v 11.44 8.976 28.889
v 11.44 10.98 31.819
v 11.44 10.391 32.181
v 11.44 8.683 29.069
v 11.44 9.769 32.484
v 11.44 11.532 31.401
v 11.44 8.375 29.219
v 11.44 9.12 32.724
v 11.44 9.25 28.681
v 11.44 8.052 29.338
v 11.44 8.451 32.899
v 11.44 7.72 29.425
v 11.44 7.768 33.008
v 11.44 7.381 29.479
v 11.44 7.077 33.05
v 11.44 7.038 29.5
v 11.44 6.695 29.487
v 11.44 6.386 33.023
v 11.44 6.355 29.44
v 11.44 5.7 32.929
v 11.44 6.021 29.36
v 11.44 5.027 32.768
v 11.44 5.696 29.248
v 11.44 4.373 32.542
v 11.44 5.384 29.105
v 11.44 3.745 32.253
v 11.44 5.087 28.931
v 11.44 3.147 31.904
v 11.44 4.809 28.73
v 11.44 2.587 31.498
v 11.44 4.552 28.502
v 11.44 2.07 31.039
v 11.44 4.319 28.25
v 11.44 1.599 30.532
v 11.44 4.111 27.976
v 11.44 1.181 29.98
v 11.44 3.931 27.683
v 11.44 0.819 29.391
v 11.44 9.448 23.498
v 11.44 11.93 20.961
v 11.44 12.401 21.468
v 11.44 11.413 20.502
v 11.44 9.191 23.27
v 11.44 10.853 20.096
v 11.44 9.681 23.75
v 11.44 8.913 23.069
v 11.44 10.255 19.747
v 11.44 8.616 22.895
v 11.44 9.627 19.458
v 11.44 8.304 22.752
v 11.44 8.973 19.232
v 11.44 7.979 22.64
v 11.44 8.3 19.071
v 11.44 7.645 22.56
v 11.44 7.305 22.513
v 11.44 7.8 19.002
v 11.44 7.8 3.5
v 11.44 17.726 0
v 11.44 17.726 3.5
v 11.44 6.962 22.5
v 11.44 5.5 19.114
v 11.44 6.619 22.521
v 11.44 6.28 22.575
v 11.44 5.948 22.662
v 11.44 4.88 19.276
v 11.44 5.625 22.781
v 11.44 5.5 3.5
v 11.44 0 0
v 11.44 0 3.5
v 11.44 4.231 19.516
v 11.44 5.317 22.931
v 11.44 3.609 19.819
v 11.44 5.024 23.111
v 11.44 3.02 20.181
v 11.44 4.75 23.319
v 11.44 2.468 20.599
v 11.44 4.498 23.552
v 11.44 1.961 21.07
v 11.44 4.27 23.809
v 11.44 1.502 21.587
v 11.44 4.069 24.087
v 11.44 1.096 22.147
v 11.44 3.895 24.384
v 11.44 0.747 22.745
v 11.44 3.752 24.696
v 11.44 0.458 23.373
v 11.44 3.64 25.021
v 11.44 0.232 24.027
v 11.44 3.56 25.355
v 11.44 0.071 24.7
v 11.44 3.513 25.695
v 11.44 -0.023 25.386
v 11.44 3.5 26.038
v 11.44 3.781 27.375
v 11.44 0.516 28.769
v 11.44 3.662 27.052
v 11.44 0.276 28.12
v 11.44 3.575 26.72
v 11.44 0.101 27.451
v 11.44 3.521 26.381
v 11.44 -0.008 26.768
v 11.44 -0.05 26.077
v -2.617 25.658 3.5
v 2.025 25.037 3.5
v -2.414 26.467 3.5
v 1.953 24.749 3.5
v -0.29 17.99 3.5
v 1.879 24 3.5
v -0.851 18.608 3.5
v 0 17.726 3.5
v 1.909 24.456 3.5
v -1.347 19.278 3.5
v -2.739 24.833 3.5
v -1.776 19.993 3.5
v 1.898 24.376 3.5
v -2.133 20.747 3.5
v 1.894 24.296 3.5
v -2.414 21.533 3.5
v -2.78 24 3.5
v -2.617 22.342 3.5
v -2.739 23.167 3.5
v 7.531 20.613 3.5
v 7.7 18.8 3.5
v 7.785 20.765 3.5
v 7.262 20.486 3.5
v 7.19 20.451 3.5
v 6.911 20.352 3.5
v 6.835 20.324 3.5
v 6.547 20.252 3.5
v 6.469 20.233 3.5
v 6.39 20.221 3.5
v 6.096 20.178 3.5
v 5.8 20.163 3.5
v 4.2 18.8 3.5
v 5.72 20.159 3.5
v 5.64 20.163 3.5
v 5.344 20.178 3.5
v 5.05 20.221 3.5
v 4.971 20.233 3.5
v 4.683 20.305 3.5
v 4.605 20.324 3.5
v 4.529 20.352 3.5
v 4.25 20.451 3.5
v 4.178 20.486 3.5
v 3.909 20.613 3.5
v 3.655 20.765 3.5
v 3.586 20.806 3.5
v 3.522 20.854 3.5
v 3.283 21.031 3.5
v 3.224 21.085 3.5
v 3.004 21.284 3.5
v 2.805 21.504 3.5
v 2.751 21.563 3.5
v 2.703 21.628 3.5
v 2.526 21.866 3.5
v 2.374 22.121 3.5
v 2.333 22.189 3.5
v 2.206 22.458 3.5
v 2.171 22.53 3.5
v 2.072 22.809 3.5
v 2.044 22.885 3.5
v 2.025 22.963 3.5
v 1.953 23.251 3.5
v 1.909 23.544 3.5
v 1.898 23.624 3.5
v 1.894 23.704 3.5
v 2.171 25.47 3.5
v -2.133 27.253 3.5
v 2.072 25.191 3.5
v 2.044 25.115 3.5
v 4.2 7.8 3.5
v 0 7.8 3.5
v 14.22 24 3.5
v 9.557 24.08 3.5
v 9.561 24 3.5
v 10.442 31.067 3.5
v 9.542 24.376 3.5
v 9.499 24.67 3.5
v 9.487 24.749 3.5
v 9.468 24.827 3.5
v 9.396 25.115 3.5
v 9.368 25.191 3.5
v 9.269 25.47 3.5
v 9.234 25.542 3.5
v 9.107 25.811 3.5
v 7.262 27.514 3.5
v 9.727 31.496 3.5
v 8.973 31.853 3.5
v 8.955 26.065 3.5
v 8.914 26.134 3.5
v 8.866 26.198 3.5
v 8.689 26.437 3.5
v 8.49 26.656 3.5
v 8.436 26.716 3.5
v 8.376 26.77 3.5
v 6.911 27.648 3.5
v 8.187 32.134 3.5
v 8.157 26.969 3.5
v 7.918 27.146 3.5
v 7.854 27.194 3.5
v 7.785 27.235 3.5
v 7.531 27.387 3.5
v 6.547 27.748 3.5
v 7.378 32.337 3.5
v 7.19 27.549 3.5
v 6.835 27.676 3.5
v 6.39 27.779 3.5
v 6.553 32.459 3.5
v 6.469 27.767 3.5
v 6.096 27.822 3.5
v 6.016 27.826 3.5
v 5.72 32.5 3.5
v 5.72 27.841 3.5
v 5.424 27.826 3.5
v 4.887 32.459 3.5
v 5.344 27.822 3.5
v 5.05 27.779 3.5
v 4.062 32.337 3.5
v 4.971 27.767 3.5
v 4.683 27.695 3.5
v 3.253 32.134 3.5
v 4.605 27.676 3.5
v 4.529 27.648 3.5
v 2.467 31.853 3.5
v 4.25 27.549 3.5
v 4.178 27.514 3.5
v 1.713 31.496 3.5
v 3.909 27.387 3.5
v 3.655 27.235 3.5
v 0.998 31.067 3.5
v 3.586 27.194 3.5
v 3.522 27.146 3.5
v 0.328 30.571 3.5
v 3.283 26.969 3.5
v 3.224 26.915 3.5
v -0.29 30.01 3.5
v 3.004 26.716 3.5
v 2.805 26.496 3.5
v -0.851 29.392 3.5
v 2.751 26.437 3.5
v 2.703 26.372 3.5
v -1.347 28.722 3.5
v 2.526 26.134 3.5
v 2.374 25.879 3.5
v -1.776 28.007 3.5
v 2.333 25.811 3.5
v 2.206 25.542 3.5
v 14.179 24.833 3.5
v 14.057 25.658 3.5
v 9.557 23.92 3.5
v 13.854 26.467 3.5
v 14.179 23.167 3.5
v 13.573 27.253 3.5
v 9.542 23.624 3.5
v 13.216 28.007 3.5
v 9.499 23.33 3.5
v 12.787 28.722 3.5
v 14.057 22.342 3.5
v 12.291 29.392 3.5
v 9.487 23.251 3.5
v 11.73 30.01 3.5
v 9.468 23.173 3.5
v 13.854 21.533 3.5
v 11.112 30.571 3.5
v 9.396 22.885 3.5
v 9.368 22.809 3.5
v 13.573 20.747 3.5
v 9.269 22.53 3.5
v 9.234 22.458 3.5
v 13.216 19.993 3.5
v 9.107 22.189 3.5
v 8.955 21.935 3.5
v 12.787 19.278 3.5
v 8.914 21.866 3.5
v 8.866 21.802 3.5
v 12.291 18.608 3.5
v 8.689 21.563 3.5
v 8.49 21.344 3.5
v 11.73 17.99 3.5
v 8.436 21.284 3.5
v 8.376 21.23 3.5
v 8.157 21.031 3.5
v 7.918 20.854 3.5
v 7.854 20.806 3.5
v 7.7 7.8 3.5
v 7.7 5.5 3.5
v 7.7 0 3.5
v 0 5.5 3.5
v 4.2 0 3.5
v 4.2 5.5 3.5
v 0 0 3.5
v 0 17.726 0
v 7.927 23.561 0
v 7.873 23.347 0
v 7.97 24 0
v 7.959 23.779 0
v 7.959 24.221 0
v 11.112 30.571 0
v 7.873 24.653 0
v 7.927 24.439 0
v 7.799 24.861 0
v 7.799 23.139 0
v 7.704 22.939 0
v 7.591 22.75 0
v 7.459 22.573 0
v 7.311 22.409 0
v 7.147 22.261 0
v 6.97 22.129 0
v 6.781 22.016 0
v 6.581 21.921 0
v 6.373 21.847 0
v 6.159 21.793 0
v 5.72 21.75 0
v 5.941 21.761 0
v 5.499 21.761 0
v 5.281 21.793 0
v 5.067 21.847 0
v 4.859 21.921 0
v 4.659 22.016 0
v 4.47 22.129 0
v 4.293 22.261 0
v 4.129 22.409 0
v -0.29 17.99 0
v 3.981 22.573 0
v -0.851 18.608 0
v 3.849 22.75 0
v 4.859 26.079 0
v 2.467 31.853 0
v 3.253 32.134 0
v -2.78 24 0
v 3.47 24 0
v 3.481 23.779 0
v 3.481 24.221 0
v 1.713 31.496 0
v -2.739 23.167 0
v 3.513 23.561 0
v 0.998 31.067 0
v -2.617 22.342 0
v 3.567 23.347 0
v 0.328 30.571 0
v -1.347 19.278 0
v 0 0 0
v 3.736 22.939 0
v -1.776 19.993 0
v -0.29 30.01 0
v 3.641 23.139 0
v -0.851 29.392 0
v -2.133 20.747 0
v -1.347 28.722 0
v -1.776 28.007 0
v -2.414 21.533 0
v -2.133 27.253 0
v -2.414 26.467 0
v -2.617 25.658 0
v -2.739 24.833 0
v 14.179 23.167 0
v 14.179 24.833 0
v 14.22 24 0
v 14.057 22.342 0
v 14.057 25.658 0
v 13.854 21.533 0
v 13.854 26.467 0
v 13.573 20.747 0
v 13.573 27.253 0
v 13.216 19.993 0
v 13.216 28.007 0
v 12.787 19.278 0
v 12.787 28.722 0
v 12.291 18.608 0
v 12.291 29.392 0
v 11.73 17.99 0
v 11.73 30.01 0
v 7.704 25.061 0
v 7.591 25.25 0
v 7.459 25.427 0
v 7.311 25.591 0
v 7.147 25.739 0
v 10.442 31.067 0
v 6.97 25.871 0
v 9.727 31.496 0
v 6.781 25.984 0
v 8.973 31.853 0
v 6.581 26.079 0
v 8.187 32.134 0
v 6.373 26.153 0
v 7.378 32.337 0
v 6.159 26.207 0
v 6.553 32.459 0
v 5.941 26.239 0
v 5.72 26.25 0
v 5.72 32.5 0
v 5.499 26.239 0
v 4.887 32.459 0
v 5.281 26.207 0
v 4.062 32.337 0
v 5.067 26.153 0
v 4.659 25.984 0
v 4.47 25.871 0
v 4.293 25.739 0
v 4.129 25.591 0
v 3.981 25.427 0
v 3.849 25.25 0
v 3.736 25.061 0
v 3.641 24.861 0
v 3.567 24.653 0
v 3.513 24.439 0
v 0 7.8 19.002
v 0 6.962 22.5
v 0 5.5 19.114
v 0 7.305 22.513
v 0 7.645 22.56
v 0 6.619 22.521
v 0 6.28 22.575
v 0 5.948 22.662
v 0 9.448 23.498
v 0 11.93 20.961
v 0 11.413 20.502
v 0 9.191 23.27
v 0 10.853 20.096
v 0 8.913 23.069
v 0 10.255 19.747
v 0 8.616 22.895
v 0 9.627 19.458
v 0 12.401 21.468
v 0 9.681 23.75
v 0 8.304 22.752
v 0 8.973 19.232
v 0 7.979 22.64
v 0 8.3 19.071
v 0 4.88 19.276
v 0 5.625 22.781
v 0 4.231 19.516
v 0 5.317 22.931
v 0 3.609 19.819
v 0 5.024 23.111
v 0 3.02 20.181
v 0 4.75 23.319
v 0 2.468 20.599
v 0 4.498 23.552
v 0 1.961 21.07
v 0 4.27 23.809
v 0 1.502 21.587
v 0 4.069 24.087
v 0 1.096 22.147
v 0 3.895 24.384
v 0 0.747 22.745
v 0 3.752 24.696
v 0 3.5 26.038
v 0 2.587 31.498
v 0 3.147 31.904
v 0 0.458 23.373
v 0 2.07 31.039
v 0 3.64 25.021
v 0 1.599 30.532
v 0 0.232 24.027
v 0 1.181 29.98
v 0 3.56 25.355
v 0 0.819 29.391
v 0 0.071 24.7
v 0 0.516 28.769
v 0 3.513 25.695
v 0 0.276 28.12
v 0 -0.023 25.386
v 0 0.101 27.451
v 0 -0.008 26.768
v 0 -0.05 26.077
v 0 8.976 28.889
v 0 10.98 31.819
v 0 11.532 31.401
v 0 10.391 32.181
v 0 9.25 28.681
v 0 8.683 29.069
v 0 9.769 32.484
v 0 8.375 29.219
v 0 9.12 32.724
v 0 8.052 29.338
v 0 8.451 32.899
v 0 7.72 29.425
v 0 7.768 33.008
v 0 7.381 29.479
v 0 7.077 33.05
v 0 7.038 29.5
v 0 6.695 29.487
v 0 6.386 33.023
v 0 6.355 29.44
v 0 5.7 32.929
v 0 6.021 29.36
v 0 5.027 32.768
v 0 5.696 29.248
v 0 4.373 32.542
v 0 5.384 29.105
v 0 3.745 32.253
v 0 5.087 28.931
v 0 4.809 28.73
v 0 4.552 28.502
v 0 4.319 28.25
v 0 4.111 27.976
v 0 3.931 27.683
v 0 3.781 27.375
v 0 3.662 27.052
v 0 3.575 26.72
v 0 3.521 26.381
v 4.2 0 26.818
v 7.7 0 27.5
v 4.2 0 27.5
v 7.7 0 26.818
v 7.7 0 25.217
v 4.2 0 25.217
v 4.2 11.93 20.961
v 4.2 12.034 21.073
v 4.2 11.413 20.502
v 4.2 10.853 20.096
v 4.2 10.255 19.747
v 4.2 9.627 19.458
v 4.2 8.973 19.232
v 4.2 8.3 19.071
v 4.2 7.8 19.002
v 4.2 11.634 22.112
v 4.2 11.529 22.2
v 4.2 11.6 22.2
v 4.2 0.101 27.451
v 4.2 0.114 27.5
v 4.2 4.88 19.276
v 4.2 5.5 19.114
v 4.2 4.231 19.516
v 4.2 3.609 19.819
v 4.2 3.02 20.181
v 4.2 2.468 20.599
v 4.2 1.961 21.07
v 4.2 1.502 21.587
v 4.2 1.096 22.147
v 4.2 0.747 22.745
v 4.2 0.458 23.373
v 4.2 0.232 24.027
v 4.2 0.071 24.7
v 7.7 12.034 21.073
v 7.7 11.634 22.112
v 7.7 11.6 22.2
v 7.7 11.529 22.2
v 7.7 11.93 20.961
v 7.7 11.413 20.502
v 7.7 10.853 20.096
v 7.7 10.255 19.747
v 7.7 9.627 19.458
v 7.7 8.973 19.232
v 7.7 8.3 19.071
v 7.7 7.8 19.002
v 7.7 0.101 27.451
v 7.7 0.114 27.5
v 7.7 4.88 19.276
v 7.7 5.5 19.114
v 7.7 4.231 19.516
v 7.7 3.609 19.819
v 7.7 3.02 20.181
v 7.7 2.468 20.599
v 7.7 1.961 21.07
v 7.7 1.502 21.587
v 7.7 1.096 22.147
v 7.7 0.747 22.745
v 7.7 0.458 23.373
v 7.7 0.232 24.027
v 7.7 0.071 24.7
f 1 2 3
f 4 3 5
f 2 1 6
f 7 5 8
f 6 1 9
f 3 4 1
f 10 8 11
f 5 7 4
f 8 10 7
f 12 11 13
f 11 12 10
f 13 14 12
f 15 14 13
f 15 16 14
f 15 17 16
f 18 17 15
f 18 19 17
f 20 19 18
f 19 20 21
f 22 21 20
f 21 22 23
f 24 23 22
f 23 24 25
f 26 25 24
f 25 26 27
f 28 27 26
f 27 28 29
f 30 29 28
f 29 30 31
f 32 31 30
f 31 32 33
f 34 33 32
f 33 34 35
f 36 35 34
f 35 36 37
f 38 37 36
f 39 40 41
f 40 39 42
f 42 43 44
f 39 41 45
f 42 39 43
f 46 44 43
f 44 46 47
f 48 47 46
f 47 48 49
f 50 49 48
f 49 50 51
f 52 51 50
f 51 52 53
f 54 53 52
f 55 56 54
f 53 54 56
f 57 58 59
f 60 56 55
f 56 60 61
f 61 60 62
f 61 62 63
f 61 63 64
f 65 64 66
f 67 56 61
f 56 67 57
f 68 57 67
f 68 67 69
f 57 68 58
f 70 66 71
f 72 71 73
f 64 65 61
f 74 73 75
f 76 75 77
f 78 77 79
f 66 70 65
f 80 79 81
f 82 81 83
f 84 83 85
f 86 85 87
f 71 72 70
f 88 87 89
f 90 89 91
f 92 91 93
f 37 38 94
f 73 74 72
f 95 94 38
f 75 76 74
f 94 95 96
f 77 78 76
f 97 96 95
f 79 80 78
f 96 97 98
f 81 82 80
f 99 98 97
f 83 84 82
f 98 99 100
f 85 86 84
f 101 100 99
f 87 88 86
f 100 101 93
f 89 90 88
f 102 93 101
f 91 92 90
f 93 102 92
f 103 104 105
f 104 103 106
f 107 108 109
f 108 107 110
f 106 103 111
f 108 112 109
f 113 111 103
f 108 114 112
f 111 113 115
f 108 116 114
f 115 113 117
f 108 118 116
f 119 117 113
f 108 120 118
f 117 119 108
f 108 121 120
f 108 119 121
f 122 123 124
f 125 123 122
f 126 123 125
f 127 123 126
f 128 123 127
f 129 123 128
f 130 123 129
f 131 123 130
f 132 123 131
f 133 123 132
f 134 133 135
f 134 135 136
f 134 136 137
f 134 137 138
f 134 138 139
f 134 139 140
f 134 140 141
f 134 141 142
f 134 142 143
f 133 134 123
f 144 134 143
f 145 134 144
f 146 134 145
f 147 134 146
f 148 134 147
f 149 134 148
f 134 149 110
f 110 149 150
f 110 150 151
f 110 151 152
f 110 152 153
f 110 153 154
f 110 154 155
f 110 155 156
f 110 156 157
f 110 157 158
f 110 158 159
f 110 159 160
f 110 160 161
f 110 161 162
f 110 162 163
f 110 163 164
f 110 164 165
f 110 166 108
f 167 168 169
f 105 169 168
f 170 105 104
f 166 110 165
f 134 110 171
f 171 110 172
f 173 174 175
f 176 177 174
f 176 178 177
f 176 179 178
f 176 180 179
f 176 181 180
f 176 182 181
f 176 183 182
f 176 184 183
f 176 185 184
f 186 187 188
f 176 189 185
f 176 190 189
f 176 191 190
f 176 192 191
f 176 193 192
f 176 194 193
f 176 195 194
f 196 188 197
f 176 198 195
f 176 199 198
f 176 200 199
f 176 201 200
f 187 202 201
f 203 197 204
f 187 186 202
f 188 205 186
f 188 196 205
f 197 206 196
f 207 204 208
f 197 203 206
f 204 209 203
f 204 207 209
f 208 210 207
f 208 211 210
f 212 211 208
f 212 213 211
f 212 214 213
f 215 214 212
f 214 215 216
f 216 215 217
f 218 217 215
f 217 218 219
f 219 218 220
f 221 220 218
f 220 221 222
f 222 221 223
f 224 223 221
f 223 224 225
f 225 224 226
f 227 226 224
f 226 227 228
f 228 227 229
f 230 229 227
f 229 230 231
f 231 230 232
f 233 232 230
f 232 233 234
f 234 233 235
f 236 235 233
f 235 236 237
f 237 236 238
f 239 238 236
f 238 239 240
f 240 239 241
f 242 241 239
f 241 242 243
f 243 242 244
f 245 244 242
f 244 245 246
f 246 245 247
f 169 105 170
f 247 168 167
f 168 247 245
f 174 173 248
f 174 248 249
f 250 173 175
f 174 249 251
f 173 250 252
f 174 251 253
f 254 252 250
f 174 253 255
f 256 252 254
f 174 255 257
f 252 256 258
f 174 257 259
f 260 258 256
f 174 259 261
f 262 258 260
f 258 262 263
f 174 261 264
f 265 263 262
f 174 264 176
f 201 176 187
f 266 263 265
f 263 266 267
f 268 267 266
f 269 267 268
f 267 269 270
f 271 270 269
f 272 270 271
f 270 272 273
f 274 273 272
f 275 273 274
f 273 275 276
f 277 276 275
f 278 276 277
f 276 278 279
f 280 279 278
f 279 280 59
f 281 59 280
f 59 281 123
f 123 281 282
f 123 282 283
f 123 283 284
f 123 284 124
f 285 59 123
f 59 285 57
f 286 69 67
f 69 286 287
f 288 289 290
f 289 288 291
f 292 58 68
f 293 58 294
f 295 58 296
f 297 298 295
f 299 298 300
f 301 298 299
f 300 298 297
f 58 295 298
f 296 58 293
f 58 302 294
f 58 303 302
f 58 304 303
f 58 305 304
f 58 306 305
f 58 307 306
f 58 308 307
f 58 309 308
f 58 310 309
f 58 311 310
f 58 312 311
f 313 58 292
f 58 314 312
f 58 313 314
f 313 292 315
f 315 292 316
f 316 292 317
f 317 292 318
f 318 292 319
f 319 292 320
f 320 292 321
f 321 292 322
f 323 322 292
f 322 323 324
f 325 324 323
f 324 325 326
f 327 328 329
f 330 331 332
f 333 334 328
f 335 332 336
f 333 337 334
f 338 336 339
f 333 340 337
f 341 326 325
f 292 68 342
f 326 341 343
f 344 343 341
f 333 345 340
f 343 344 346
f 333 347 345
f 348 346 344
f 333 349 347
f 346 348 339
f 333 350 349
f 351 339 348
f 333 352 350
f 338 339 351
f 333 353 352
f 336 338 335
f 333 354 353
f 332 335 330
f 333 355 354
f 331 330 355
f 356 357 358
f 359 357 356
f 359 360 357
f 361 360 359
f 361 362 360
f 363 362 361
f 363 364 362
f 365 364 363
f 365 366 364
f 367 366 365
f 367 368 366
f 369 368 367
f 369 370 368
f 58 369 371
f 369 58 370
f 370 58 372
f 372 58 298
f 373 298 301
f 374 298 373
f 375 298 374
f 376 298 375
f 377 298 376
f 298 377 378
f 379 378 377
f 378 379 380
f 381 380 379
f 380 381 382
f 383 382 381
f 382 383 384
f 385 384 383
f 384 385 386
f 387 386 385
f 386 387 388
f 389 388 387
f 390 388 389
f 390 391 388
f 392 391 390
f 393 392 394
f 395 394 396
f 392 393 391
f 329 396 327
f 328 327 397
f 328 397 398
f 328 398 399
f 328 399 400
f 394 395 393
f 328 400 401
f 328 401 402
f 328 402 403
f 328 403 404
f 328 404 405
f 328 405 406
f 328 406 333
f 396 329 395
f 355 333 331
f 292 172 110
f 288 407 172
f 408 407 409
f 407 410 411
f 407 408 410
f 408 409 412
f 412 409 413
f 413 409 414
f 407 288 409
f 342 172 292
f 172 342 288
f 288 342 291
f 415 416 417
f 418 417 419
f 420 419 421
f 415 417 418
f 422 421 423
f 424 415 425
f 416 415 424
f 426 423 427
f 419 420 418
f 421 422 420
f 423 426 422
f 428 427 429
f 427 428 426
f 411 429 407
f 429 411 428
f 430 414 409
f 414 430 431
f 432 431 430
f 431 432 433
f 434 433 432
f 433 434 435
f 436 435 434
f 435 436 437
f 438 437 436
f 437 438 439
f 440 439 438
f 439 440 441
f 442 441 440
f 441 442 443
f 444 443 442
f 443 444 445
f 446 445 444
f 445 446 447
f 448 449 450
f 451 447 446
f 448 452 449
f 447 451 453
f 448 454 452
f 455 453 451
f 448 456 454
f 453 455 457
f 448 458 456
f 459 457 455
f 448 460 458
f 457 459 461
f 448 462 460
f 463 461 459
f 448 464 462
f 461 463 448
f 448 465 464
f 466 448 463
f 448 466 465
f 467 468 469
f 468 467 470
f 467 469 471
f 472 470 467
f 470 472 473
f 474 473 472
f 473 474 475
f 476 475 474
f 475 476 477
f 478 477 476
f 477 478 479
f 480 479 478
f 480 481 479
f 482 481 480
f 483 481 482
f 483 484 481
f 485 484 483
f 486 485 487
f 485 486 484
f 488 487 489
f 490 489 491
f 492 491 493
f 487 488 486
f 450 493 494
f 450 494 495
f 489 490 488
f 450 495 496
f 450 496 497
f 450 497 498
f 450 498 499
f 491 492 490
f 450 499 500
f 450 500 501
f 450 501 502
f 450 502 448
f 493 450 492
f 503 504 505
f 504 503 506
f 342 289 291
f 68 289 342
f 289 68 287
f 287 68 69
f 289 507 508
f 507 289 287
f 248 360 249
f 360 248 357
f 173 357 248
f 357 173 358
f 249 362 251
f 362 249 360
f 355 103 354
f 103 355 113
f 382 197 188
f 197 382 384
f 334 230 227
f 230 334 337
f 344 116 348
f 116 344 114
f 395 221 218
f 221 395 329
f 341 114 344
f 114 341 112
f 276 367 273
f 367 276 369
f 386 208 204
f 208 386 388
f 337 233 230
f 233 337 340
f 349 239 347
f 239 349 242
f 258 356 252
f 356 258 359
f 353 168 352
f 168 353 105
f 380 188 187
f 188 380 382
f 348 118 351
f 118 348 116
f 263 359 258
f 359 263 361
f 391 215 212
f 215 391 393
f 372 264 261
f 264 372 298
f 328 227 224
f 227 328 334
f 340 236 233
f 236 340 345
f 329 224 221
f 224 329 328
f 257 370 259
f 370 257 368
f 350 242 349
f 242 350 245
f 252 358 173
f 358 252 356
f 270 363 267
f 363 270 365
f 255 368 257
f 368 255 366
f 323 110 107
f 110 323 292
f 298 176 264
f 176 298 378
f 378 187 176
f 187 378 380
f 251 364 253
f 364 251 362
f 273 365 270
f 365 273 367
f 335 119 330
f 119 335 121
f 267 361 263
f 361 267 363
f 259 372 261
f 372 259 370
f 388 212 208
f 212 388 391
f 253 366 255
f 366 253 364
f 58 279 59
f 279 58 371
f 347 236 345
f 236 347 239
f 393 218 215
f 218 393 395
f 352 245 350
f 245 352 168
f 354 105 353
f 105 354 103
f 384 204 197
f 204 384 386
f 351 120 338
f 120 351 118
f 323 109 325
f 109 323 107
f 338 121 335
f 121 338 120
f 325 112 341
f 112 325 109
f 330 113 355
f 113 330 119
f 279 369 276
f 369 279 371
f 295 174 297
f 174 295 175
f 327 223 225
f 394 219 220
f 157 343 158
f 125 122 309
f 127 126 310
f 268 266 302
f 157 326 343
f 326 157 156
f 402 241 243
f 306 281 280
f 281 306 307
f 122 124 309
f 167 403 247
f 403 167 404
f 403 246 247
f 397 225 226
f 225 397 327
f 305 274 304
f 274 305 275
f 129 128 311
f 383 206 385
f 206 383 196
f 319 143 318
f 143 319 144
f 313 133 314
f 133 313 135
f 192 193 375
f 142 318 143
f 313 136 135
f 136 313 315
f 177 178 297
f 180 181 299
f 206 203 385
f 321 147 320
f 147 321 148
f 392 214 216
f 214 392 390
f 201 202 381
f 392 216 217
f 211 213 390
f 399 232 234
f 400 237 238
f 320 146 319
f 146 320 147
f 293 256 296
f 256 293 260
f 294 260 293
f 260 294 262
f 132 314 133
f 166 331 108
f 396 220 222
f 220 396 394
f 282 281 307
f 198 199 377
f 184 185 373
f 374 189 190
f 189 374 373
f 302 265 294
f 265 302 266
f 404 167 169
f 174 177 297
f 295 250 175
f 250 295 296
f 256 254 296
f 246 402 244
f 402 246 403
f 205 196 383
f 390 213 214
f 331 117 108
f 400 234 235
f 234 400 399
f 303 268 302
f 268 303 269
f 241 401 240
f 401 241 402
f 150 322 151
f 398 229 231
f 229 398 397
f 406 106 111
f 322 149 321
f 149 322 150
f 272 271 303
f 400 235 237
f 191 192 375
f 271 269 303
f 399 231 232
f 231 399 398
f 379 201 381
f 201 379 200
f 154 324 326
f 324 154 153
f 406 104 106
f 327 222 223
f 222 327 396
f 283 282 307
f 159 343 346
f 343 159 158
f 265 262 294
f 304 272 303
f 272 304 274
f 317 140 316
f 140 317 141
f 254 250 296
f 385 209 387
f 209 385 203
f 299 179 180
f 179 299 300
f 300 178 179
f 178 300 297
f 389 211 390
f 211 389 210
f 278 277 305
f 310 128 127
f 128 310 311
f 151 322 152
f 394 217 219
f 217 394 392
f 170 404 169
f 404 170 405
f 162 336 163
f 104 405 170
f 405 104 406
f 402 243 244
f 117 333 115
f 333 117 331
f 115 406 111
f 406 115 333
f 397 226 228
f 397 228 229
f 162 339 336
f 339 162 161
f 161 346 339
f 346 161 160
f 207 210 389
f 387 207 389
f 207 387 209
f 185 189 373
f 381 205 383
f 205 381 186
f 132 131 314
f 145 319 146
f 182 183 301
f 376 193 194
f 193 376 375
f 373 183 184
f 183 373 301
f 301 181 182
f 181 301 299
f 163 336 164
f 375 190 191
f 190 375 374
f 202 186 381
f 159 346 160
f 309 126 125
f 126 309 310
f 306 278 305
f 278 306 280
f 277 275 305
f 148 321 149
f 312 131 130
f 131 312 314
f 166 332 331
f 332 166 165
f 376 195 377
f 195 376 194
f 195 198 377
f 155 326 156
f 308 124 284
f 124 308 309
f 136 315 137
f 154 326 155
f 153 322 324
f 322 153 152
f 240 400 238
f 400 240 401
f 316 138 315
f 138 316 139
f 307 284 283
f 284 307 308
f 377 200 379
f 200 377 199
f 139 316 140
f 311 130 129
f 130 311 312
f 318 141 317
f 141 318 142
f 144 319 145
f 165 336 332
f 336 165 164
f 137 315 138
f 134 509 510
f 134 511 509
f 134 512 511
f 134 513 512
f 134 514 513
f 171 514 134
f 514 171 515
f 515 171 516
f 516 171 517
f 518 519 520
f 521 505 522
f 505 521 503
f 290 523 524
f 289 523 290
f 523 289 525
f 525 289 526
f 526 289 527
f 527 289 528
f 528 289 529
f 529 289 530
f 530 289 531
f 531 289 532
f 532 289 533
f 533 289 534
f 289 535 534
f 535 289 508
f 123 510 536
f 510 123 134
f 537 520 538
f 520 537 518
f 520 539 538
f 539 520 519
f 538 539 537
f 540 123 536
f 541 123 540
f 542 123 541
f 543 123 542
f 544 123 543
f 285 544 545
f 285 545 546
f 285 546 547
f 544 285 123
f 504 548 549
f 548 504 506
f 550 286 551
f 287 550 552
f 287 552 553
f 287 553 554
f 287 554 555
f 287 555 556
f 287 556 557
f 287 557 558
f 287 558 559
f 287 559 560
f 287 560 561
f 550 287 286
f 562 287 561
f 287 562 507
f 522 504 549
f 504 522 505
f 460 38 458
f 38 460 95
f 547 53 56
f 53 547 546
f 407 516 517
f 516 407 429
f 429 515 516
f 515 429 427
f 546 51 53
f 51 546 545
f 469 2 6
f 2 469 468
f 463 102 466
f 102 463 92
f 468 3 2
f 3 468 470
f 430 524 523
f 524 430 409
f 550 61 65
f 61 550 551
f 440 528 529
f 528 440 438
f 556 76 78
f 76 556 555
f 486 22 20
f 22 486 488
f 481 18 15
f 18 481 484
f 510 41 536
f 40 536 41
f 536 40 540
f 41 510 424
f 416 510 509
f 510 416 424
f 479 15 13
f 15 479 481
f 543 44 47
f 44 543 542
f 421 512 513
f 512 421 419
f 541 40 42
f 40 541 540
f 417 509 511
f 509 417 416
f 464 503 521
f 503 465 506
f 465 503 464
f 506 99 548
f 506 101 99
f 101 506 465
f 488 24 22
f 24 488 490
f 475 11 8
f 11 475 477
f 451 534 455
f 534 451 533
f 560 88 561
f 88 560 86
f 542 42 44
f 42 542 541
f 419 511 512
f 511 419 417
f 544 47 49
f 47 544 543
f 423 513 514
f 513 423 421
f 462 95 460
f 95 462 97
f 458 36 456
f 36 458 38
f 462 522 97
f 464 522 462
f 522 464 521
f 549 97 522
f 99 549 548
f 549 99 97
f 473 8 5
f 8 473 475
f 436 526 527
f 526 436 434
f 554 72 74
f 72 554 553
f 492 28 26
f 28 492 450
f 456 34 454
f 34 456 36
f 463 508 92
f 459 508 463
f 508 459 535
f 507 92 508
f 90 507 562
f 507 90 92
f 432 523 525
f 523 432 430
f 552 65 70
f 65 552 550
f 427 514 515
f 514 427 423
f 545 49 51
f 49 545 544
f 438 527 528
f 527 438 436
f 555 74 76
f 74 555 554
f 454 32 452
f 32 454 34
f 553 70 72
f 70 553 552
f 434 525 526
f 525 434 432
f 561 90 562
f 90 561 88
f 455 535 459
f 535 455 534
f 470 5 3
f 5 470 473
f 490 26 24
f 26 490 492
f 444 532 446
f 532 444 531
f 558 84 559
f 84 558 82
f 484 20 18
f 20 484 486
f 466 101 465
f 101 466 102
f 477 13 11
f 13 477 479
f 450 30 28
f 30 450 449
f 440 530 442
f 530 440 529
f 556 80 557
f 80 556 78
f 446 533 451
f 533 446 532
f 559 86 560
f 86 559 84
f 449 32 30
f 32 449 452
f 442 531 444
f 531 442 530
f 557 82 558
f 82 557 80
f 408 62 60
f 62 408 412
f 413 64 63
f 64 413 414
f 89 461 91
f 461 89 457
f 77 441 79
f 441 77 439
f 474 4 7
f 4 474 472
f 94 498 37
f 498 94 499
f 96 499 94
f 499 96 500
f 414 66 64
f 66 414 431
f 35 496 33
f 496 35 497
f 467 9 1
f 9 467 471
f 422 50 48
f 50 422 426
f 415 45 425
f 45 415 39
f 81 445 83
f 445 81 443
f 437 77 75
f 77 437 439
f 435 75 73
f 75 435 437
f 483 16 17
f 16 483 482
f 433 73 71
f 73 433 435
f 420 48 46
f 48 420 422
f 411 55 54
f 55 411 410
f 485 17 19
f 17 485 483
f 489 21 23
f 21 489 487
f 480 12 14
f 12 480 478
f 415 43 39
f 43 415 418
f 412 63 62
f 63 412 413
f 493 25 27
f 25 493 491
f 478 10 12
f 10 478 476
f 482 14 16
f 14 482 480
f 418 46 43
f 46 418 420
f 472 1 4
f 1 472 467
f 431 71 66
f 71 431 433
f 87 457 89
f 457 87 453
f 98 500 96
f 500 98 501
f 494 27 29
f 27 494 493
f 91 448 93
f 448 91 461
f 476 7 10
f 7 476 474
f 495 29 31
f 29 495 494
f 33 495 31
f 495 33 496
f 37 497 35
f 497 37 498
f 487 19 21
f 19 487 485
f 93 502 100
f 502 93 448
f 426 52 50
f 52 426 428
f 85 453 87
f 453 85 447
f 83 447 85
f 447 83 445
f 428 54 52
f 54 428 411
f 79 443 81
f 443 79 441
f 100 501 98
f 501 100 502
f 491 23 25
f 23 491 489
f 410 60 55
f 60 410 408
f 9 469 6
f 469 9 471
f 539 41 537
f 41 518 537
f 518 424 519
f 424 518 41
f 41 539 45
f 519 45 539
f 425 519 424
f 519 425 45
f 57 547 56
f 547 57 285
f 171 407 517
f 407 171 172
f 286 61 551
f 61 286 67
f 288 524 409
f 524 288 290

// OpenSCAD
/* Copyleft Roy Sigurd Karlsbakk <roy@karlsbakk.net> 2019
 * Dings for å ersatatte drit fra Plantasjen
 *
 * Lisens  CC BY-NC https://creativecommons.org/licenses/by-nc/4.0/legalcode.no
 * License CC BY-NC https://creativecommons.org/licenses/by-nc/4.0/legalcode
 */

$fn=64;

cube_x=11.44;
cube_y=19.25;
cube_z=3.5;

wall_width=cube_z;

bottom_cube=[cube_x,cube_y,cube_z];
circle_center=[cube_x/2,24];
outer_circle_d=17;
cone_outer_d=10;
cone_inner_d=4.5;
cone_edge=0.5;
screw_cyl_height=2;
cone_height=screw_cyl_height+cube_z;
out_pin_thickness=2.54;
out_pin_x=8.5;
out_pin_y=2.3;
out_pin_z=18;
//out_pin_origo=[1.35,5.5,cube_z];
out_pin_origo=[0,5.5,cube_z];
back_out_y_bottom=0.5;
back_out_y_top=3.2;
front_out_y_bottom=back_out_y_bottom+19;
front_out_y_top=back_out_y_top+9;

module festering(width, outer_d, inner_d, rotational_angle=360) {
    difference() {
        cylinder(d=outer_d, h=width);
        cylinder(d=inner_d, h=width);
        translate([0,0,0]) {
            rotate([0,0,0]) {
                cube([7.5,7.5,cube_x]);
            }
        }
    }
}

module base() {
    cube(bottom_cube);
    translate(circle_center)  {
        cylinder(d=outer_circle_d,h=cube_z);
//        cylinder(h=cone_height,d=cone_outer_d);
    }
}

module trekantdings() {
    fra_x=4.2;
    fra_y=0.3;
    trekanthoyde=18.7;
    trekantfram_topp=8.2;
    trekantfram_bunn=18.5;
    helling_y=2.5;
    trekantdybde_y=8.8;
    forsterkning=0;

    polypoints=[
        [fra_x,fra_y,cube_z],                                                   // 0
        [fra_x-forsterkning,fra_y+trekantfram_bunn,cube_z],                                  // 1
        [fra_x+forsterkning+wall_width,fra_y+trekantfram_bunn,cube_z],                       // 2
        [fra_x+forsterkning+wall_width,fra_y,cube_z],                                        // 3
        [fra_x-forsterkning,fra_y+helling_y,cube_z+trekanthoyde],                            // 4
        [fra_x-forsterkning,fra_y+helling_y+trekantdybde_y,cube_z+trekanthoyde],             // 5
        [fra_x+forsterkning+wall_width,fra_y+helling_y+trekantdybde_y,cube_z+trekanthoyde],  // 6
        [fra_x+forsterkning+wall_width,fra_y+helling_y,cube_z+trekanthoyde]                  // 7
    ];
    polyfaces=[
        [0,3,2,1],
        [1,2,6,5],
        [4,5,6,7],
        [0,4,7,3],
        [0,1,5,4],
        [2,3,7,6],
    ];
    polyhedron(polypoints, polyfaces);

    // Korreksjonsblokk
    
    translate([fra_x,0,cube_z]) {
        cube([wall_width,wall_width,24]);
    }    
}
difference() {
    base();
    translate(circle_center)  {
        cylinder(d1=cone_inner_d,d2=cone_outer_d-cone_edge,h=cone_height);
    }
}
translate(out_pin_origo) {
    cube([cube_x,out_pin_y,out_pin_z]);
}
trekantdings();

translate([0,7,26]) {
    rotate([90,40,90]) {
        festering(width=cube_x, outer_d=14.1, inner_d=7);
    }
}
